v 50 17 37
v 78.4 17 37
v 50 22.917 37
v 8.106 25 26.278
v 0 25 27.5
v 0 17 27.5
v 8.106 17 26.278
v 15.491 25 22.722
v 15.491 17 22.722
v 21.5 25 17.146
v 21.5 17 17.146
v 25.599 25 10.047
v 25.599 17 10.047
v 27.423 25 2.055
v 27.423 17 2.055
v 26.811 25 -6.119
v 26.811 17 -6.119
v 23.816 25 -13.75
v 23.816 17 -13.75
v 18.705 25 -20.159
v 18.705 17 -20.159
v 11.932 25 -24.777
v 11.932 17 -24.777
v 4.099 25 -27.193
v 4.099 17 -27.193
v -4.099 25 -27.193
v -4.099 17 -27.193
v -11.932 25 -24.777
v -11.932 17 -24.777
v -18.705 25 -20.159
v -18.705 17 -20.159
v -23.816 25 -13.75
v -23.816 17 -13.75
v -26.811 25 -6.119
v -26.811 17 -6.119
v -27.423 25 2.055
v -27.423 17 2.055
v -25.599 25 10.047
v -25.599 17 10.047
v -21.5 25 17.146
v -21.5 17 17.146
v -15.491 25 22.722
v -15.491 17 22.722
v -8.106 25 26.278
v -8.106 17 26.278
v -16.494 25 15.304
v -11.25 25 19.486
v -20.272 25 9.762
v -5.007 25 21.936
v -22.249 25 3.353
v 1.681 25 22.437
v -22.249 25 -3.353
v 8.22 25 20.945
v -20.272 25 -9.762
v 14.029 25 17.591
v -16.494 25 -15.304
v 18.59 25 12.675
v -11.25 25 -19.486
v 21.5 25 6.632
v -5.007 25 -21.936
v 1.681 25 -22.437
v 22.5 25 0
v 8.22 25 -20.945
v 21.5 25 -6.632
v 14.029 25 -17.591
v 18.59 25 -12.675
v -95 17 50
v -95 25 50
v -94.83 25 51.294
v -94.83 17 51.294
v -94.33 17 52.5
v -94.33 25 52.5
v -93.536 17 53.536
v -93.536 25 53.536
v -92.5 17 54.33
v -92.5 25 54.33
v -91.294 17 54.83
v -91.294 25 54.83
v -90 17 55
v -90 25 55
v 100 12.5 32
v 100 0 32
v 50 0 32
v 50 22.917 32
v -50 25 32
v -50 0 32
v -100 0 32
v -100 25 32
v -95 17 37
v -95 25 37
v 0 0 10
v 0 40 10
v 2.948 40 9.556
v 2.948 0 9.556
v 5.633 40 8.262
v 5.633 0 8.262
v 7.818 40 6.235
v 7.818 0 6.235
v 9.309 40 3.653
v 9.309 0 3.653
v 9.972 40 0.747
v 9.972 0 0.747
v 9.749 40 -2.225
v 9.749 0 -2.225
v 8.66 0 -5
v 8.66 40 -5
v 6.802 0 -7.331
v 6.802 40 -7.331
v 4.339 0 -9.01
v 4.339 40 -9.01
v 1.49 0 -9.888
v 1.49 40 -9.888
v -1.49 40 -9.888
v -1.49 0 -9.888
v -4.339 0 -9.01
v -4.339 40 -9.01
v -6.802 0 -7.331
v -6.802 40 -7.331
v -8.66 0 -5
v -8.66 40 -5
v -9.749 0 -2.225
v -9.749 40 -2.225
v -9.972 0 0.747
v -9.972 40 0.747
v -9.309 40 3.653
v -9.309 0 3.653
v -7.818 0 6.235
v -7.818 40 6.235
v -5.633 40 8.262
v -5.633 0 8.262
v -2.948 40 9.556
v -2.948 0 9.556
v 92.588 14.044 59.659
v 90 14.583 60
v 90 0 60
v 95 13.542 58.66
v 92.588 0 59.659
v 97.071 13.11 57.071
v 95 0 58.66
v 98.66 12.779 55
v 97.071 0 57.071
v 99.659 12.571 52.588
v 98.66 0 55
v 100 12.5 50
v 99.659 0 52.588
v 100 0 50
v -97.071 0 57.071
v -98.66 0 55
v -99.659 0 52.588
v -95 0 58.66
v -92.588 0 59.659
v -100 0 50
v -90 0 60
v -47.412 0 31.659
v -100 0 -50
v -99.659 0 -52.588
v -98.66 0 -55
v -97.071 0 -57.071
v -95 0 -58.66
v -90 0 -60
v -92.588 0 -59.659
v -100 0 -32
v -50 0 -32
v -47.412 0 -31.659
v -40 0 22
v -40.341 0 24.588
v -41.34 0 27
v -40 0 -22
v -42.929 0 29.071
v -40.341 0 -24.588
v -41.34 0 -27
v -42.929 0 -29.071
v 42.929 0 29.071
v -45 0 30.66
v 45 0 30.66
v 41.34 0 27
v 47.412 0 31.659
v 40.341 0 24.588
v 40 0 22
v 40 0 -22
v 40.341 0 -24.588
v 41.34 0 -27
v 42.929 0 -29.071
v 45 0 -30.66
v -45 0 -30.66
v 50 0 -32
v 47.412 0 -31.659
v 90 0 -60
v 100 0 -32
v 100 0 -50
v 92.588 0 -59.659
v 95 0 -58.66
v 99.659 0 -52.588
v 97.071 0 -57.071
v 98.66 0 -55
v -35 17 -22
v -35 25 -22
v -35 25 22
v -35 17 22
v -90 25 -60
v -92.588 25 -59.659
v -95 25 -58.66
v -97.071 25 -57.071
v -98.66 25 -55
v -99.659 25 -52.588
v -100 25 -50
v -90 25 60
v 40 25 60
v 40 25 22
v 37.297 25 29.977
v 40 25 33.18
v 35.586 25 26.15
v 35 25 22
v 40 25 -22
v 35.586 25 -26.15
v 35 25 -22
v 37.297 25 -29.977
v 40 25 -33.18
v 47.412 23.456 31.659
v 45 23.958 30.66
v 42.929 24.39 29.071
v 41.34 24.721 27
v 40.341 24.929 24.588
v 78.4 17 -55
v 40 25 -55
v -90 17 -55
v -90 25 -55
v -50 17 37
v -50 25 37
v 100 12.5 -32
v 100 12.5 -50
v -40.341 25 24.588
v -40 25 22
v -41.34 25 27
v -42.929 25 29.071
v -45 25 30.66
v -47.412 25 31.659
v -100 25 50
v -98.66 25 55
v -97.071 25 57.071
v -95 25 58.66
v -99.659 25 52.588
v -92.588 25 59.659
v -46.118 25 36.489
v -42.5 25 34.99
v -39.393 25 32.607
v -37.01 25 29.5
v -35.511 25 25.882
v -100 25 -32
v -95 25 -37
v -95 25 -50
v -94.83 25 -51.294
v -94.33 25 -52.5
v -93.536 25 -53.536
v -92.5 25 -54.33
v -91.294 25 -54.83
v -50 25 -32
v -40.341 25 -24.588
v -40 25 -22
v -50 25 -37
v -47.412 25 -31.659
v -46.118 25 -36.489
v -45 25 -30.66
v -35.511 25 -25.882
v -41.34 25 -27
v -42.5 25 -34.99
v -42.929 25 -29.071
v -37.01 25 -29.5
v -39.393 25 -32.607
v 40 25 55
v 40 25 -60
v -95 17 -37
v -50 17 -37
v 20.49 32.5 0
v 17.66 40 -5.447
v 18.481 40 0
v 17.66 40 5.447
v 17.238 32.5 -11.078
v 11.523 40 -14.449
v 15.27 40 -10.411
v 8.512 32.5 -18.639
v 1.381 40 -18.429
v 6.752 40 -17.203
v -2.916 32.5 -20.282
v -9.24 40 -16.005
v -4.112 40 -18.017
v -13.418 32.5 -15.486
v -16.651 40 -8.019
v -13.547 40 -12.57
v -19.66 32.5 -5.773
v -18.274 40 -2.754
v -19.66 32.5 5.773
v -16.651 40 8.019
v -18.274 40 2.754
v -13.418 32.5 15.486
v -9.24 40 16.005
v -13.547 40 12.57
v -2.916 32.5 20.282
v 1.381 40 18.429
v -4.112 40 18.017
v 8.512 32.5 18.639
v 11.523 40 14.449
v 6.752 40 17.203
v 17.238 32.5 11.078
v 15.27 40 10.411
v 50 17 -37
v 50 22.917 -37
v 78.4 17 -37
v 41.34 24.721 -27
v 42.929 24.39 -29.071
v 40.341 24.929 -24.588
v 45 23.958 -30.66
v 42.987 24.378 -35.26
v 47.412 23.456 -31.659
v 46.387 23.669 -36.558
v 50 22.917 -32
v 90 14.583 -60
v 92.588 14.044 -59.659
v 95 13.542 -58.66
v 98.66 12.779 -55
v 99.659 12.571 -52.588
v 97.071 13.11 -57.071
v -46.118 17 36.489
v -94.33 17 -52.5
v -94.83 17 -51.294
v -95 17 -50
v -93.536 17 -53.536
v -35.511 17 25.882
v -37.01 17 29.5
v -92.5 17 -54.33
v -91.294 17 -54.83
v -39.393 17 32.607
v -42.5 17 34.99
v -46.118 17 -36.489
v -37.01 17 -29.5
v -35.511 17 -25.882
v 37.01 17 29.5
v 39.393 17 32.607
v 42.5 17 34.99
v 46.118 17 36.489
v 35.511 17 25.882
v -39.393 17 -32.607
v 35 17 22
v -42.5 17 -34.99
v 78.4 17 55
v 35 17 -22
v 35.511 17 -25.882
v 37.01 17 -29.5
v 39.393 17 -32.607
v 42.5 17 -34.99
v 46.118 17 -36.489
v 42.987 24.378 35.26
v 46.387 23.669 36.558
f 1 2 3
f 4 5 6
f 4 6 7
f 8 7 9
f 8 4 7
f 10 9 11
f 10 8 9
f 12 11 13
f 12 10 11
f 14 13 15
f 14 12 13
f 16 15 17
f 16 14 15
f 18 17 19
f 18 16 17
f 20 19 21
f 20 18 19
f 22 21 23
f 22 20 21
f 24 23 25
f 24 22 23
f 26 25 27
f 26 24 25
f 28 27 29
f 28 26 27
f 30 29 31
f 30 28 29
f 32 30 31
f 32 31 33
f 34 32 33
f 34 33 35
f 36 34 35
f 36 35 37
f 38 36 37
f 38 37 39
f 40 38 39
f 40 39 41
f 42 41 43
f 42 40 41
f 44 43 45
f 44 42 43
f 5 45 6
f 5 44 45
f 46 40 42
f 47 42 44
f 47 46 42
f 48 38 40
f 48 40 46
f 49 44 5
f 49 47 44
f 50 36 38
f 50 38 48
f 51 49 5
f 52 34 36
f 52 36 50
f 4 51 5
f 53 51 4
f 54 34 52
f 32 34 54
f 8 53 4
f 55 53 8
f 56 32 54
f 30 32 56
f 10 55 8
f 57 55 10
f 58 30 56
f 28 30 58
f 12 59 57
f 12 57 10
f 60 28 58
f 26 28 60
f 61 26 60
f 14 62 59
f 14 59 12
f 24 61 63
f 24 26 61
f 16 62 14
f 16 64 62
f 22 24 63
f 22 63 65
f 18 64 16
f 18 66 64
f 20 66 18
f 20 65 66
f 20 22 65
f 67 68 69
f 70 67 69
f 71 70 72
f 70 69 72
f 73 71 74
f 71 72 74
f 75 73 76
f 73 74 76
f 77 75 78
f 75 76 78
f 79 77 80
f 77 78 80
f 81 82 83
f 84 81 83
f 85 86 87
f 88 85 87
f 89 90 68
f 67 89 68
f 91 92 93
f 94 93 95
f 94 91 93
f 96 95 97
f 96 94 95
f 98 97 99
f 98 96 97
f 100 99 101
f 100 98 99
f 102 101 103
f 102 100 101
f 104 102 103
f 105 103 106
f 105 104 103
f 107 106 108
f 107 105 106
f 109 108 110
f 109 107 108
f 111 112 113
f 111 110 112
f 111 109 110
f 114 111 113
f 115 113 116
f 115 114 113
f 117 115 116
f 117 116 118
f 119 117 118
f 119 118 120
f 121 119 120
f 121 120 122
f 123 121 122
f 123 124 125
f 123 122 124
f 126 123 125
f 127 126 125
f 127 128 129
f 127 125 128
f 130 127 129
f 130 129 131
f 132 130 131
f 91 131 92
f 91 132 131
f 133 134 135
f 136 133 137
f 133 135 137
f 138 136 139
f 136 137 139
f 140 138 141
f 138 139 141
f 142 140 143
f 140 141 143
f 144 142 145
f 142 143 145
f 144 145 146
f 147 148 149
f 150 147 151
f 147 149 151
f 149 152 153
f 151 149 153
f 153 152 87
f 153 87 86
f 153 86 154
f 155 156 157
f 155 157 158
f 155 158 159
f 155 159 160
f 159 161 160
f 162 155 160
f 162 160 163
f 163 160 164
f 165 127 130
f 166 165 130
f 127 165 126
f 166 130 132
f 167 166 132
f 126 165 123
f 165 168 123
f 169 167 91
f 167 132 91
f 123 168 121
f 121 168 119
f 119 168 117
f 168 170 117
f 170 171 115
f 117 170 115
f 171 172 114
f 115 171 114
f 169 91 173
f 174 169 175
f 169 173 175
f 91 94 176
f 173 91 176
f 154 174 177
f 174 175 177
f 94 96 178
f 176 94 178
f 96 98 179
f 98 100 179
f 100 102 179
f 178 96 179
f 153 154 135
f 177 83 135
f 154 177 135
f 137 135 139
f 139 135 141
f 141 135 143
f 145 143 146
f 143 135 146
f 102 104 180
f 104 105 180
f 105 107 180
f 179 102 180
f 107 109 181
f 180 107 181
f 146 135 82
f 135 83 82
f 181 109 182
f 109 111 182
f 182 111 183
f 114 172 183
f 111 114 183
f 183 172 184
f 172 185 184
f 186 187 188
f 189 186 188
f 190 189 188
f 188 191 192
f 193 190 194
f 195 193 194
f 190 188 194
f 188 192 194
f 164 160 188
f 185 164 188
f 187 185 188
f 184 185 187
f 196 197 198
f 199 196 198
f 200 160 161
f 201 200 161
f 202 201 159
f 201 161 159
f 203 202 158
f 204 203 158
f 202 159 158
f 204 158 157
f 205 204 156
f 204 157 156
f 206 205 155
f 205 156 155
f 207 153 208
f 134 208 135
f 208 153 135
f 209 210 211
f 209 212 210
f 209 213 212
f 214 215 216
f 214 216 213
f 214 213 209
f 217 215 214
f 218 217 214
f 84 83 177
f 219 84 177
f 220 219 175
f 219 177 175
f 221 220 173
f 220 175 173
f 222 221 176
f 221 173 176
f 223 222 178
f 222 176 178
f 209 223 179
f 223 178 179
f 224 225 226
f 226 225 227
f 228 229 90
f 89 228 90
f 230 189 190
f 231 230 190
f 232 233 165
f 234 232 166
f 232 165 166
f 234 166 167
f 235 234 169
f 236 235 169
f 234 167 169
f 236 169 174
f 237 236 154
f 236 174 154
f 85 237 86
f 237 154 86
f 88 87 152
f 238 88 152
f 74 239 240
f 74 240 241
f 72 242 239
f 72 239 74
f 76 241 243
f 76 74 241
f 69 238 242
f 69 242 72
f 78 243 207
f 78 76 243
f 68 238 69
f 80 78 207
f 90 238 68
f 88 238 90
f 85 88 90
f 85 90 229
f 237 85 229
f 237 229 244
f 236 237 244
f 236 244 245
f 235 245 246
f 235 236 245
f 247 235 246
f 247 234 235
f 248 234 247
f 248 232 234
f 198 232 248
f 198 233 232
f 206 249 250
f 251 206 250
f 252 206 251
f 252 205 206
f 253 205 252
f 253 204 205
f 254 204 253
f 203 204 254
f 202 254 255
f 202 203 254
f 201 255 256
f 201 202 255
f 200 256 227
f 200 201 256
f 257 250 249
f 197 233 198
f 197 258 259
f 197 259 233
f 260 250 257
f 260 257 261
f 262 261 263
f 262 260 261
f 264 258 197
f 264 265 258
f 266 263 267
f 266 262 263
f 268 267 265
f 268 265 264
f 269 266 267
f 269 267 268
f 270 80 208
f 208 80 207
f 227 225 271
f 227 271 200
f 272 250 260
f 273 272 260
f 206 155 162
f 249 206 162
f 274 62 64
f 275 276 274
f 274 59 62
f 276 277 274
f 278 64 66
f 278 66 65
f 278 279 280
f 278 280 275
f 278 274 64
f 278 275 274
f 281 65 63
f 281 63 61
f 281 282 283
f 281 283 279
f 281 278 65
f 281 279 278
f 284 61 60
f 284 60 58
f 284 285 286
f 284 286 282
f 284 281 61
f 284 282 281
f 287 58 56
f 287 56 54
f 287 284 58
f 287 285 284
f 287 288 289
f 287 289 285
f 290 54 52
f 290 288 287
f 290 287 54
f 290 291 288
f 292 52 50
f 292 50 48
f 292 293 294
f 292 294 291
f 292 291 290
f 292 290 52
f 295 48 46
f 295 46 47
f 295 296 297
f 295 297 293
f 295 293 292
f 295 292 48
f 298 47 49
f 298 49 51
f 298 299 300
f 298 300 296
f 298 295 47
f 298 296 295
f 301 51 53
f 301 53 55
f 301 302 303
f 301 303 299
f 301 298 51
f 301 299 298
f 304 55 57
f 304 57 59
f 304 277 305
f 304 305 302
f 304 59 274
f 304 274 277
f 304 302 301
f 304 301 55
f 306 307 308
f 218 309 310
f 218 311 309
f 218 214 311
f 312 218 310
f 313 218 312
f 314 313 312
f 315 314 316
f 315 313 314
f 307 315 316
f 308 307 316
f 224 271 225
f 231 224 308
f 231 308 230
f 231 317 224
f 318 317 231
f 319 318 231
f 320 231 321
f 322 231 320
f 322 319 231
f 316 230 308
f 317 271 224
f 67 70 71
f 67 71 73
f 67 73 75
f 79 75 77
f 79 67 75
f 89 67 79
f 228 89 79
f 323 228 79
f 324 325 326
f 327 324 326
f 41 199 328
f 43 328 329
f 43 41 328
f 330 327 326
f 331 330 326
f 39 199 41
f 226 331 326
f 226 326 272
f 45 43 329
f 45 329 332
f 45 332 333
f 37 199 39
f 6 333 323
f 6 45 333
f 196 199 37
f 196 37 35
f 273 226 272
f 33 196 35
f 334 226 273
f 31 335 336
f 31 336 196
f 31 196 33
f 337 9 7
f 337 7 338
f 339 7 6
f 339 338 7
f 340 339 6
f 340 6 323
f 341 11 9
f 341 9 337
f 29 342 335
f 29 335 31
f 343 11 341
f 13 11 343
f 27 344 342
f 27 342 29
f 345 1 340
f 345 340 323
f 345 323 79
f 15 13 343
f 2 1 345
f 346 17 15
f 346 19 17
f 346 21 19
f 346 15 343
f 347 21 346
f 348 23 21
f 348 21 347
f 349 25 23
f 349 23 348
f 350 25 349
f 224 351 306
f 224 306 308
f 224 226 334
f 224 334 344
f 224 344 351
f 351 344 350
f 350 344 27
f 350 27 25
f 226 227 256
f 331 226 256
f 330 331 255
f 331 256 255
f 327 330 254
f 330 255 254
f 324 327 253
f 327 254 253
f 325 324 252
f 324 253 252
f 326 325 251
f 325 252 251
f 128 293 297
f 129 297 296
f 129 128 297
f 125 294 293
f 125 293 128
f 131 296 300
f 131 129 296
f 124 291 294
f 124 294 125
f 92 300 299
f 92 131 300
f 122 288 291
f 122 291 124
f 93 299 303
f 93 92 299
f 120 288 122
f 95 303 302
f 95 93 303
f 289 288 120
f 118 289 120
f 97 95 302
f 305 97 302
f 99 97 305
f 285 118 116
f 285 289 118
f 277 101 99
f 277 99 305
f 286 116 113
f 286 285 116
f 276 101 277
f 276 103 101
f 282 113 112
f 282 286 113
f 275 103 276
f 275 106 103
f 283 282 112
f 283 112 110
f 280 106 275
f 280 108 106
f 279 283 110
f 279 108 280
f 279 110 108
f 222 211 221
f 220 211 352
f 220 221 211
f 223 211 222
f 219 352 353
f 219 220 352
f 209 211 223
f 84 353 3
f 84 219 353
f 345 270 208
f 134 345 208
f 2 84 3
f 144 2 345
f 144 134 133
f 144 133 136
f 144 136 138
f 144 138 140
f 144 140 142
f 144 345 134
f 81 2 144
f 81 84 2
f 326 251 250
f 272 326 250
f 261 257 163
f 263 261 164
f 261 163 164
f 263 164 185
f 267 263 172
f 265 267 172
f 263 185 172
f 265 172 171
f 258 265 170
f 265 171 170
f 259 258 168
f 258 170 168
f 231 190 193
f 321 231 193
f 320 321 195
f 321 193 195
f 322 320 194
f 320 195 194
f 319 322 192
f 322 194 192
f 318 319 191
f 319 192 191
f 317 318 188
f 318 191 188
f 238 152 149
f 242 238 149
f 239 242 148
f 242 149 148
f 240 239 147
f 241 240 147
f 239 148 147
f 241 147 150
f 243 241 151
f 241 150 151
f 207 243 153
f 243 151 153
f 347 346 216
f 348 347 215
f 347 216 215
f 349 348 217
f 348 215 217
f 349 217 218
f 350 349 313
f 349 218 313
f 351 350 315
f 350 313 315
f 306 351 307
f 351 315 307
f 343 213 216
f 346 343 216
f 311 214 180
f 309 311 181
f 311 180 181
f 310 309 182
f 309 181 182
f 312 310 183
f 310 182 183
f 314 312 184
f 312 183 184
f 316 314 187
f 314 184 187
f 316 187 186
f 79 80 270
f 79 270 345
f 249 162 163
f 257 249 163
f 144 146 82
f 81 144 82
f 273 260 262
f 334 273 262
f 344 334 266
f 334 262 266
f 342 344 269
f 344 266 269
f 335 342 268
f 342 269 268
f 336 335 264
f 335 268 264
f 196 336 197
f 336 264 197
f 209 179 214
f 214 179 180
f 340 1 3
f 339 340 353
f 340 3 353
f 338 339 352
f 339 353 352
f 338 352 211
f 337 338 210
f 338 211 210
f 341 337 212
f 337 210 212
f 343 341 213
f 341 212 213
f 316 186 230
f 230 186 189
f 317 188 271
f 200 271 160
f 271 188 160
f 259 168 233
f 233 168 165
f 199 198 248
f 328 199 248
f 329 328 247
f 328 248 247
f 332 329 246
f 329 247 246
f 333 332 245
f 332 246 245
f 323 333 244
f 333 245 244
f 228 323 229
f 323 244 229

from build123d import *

# Parameters (mm, degrees)
BOSS_EXTRUDE1_DEPTH     = 25
BOSS_EXTRUDE2_START     = 25
SKETCH1_3_R             = 22.5
BOSS_EXTRUDE2_DEPTH     = 15
BOSS_EXTRUDE2_TAPER     = 15
SKETCH4_R               = 27.5
CUT_EXTRUDE3_DEPTH      = 8
SKETCH1_4_R             = 10
CUT_EXTRUDE1_DEPTH      = 124.288280092
CUT_EXTRUDE2_DEPTH      = 124.288280092
CUT_EXTRUDE2_DEPTH_BACK = 124.288280092


with BuildPart() as part:
    # Sketch1 → Boss-Extrude1 (new body)
    with BuildSketch(Plane(origin=(0, 0, 0), x_dir=(1, 0, 0), z_dir=(0, 1, 0))):
        with BuildLine():
            Line((-90, -60), (90, -60))
            ThreePointArc((90, -60), (97.071067812, -57.071067812), (100, -50))
            Line((100, -50), (100, -32))
            Line((100, -32), (50, -32))
            ThreePointArc((50, -32), (42.928932188, -29.071067812), (40, -22))
            Line((40, -22), (40, 22))
            ThreePointArc((40, 22), (42.928932188, 29.071067812), (50, 32))
            Line((50, 32), (100, 32))
            Line((100, 32), (100, 50))
            ThreePointArc((100, 50), (97.071067812, 57.071067812), (90, 60))
            Line((90, 60), (-90, 60))
            ThreePointArc((-90, 60), (-97.071067812, 57.071067812), (-100, 50))
            Line((-100, 50), (-100, 32))
            Line((-100, 32), (-50, 32))
            ThreePointArc((-50, 32), (-42.928932188, 29.071067812), (-40, 22))
            Line((-40, 22), (-40, -22))
            ThreePointArc((-40, -22), (-42.928932188, -29.071067812), (-50, -32))
            Line((-50, -32), (-100, -32))
            Line((-100, -32), (-100, -50))
            ThreePointArc((-100, -50), (-97.071067812, -57.071067812), (-90, -60))
        make_face()
    extrude(amount=BOSS_EXTRUDE1_DEPTH)

    # Sketch1<3> → Boss-Extrude2 (add)
    with BuildSketch(Plane(origin=(0, 0, 0), x_dir=(1, 0, 0), z_dir=(0, 1, 0)).offset(BOSS_EXTRUDE2_START)):
        Circle(SKETCH1_3_R)
    extrude(amount=BOSS_EXTRUDE2_DEPTH, taper=BOSS_EXTRUDE2_TAPER)

    # Sketch4 → Cut-Extrude3 (cut)
    with BuildSketch(Plane(origin=(0, 25, 0), x_dir=(1, 0, 0), z_dir=(0, 1, 0))):
        with BuildLine():
            Line((-95, 50), (-95, 37))
            Line((-95, 37), (-50, 37))
            ThreePointArc((-50, 37), (-39.393398282, 32.606601718), (-35, 22))
            Line((-35, 22), (-35, -22))
            ThreePointArc((-35, -22), (-39.393398282, -32.606601718), (-50, -37))
            Line((-50, -37), (-95, -37))
            Line((-95, -37), (-95, -50))
            ThreePointArc((-95, -50), (-93.535533906, -53.535533906), (-90, -55))
            Line((-90, -55), (90, -55))
            ThreePointArc((90, -55), (93.535533906, -53.535533906), (95, -50))
            Line((95, -50), (95, -37))
            Line((95, -37), (50, -37))
            ThreePointArc((50, -37), (39.393398282, -32.606601718), (35, -22))
            Line((35, -22), (35, 22))
            ThreePointArc((35, 22), (39.393398282, 32.606601718), (50, 37))
            Line((50, 37), (95, 37))
            Line((95, 37), (95, 50))
            ThreePointArc((95, 50), (93.535533906, 53.535533906), (90, 55))
            Line((90, 55), (-90, 55))
            ThreePointArc((-90, 55), (-93.535533906, 53.535533906), (-95, 50))
        make_face()
        with Locations(Location((0, 0, 0), (0, 0, 270))):
            Circle(SKETCH4_R, mode=Mode.SUBTRACT)
    extrude(amount=-CUT_EXTRUDE3_DEPTH, mode=Mode.SUBTRACT)

    # Sketch1<4> → Cut-Extrude1 (cut, through all)
    with BuildSketch(Plane(origin=(0, 0, 0), x_dir=(1, 0, 0), z_dir=(0, 1, 0))):
        with Locations(Location((0, 0, 0), (0, 0, 270))):
            Circle(SKETCH1_4_R)
    extrude(amount=CUT_EXTRUDE1_DEPTH, mode=Mode.SUBTRACT)

    # Sketch3 → Cut-Extrude2 (cut, two sides: drawn at the far end of the back side and taken through both)
    with BuildSketch(Plane.XY.offset(-CUT_EXTRUDE2_DEPTH_BACK)):
        Polygon((40, 25), (100, 12.5), (100, 25), align=None)
    extrude(amount=CUT_EXTRUDE2_DEPTH + CUT_EXTRUDE2_DEPTH_BACK, mode=Mode.SUBTRACT)


solid = part.part
